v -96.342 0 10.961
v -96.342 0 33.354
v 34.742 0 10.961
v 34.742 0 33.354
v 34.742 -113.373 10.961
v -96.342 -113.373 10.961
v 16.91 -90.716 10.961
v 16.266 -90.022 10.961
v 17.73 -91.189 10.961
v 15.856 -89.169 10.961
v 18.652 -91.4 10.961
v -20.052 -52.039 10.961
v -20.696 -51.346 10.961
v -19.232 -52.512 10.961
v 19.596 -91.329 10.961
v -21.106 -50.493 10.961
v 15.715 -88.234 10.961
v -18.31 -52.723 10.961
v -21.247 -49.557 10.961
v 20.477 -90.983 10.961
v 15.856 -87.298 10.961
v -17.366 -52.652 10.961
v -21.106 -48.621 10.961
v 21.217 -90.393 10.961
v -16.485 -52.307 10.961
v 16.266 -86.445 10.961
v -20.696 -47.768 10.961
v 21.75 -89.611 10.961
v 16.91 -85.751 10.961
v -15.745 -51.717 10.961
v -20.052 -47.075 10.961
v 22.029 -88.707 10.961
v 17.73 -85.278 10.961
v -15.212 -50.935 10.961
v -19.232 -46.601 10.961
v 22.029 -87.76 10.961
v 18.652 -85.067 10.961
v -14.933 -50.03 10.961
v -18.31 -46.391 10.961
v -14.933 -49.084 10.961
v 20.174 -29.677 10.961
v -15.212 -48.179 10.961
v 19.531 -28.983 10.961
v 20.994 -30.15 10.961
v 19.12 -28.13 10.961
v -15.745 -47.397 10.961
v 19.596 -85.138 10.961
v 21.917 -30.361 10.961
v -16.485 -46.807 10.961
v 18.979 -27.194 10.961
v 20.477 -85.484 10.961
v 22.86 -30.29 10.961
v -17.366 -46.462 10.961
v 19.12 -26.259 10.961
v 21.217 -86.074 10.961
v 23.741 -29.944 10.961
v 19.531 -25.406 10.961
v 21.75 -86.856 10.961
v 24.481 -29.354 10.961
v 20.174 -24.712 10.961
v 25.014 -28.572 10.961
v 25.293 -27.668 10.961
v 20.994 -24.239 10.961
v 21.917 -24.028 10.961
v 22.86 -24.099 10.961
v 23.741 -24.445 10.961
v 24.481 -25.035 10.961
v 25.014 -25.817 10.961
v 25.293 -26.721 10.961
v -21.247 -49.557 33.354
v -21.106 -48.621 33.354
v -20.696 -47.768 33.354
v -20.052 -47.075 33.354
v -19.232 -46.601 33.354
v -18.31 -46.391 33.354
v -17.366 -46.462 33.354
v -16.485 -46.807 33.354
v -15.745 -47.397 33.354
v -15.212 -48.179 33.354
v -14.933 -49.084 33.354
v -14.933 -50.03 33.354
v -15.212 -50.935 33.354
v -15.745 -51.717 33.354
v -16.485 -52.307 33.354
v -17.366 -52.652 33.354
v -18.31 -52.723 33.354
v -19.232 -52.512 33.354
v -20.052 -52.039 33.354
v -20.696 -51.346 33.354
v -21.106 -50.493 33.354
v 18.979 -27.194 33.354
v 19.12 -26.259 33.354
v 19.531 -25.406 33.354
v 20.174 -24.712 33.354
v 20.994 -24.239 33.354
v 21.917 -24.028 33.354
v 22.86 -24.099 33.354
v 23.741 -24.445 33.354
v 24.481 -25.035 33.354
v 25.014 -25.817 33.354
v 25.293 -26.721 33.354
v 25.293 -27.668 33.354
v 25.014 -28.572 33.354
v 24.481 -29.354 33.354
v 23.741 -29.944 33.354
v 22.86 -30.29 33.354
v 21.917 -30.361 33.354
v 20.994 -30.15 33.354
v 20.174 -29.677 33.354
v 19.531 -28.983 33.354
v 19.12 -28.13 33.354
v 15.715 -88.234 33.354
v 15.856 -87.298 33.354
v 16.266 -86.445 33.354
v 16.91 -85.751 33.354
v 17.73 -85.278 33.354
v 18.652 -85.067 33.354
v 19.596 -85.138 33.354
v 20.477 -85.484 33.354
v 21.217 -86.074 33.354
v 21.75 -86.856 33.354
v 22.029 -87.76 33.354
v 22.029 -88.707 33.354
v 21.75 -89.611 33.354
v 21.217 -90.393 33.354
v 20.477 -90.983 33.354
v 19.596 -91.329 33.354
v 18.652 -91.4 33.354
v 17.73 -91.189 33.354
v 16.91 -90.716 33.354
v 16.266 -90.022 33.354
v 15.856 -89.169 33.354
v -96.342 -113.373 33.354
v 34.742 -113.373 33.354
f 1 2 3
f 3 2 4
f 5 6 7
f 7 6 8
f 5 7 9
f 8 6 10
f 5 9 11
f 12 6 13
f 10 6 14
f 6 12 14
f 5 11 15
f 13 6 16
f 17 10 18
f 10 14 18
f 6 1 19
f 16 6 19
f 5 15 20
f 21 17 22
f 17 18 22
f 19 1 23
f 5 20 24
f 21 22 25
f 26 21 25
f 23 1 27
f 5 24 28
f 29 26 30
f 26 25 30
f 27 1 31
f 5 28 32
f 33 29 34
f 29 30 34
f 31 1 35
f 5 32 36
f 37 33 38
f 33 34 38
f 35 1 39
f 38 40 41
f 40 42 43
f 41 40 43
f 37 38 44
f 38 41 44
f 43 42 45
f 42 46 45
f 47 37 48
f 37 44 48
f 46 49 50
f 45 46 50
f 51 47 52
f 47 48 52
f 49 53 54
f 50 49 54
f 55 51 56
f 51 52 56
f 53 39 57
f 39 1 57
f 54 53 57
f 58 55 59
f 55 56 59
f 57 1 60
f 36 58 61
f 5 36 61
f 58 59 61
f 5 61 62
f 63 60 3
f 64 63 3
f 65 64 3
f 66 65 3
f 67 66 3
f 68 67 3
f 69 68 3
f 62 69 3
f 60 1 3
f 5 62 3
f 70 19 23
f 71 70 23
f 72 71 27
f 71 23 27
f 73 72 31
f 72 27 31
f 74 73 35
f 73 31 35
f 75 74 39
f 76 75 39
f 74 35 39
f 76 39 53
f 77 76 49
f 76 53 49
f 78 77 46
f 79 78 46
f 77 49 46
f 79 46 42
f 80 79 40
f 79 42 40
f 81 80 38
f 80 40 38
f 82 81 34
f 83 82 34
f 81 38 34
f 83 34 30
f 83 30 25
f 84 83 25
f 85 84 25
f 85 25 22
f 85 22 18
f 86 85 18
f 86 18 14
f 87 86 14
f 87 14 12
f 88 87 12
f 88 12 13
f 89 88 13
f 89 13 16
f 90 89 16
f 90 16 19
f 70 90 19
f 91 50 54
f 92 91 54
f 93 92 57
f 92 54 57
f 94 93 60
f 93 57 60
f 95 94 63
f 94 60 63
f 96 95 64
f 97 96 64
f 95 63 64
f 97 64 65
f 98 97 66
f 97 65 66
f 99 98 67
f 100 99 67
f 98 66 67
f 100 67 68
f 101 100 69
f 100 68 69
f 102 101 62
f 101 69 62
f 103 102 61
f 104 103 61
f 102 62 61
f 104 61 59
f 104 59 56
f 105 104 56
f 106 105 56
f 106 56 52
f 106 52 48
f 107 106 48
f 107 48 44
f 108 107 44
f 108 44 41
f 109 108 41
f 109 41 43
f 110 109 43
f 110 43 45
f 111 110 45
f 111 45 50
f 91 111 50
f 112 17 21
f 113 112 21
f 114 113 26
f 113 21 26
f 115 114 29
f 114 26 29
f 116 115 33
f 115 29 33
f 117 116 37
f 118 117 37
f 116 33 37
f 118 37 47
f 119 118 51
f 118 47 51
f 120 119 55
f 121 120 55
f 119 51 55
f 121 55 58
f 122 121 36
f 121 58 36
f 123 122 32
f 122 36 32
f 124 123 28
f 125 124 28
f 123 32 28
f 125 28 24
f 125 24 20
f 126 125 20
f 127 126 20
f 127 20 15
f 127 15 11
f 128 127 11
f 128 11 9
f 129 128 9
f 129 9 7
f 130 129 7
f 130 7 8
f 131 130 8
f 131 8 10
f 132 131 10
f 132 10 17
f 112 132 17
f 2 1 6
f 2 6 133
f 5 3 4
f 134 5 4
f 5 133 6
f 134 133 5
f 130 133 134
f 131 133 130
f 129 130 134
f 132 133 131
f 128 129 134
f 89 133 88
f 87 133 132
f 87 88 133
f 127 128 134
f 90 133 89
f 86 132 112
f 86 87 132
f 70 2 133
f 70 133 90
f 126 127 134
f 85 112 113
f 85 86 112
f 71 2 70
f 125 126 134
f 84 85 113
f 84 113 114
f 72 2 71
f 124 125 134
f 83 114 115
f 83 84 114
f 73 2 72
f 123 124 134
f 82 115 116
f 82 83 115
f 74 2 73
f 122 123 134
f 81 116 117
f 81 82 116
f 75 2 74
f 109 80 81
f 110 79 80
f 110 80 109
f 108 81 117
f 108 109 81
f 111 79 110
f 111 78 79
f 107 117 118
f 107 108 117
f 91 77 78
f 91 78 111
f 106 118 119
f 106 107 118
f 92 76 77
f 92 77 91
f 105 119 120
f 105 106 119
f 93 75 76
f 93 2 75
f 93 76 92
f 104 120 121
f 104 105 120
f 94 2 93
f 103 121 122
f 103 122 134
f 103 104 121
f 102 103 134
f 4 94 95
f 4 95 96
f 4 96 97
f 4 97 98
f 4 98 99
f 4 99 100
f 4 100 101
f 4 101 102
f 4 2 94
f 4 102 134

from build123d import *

# Parameters (mm, degrees)
F0_W     = 131.084383
F0_H     = 22.393003
F1_DEPTH = 113.37322
F3_D     = 6.35


with BuildPart() as f1:
    # F0 (on Front) → F1 (new body)
    with BuildSketch(Plane.XZ):
        with Locations((-30.799992, 22.157069)):
            Rectangle(F0_W, F0_H)
    extrude(amount=F1_DEPTH)

    # F3 (through all)
    with Locations(Plane.XY.offset(33.353571)):
        with Locations((22.153882, -27.194425), (-18.072352, -49.556963), (18.889636, -88.233575)):
            Hole(F3_D / 2)


solid = f1.part
